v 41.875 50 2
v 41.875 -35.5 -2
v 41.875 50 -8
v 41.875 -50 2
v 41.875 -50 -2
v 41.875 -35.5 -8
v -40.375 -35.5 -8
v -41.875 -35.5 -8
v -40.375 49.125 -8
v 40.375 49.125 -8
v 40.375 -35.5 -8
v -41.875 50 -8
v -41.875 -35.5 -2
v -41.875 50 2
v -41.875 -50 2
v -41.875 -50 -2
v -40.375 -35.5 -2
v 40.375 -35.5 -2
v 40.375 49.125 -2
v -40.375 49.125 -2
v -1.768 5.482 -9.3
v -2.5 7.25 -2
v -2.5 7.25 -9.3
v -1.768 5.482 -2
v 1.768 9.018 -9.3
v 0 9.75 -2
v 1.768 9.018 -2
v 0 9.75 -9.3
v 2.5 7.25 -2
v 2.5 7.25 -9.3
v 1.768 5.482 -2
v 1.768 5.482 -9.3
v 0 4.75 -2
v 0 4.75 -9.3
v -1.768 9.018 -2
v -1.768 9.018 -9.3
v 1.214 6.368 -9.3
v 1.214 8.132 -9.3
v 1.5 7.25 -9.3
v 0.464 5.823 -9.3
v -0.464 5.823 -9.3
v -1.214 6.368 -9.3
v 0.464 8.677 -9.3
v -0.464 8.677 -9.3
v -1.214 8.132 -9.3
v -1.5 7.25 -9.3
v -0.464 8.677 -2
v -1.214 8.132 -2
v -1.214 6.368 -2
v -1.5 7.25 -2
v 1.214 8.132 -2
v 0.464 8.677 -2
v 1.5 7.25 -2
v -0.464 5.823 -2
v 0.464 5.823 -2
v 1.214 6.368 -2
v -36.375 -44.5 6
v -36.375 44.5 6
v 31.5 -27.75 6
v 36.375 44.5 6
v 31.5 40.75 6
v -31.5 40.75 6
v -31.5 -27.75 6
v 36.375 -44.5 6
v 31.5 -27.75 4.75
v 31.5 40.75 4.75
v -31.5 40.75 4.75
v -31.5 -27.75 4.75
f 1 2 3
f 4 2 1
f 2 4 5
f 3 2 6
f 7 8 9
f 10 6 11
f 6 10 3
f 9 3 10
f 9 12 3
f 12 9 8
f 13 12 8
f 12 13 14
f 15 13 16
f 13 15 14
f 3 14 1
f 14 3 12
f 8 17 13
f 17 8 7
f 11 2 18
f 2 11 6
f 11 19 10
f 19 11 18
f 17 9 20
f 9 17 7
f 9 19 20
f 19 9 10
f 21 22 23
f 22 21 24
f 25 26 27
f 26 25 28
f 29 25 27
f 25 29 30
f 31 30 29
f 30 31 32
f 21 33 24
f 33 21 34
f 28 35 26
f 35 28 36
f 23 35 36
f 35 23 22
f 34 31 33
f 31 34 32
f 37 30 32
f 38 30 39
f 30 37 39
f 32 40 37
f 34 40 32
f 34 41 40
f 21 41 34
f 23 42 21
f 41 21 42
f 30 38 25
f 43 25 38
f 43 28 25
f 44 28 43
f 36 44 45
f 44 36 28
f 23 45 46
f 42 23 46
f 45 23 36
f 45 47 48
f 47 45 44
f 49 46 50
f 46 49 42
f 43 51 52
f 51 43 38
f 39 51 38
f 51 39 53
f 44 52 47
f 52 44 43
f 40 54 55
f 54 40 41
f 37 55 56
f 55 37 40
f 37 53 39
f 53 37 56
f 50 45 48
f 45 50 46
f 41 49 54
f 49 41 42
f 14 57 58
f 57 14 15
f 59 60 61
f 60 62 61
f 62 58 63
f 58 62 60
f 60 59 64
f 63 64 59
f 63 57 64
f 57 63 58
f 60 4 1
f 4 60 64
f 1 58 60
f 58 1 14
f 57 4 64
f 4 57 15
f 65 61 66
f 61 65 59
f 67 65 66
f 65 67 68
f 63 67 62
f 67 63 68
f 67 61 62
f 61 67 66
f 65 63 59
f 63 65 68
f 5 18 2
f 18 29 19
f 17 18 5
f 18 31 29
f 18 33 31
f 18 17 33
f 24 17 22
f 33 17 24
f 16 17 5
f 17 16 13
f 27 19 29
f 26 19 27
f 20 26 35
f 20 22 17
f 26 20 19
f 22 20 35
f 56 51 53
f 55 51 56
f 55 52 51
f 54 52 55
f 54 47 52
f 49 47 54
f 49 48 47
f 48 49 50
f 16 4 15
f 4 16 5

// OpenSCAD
// the overall length of the cartridge (make longer for more stuff, like a PC-6006 does)
OVERALL_LENGTH = 100;
OVERALL_WIDTH = 83.75;

RIB_HEIGHT = 4;

// What part of the shell to render
DRAW_WHICH = "top"; // [ "top", "bottom", "both" ]

// lip on side of cartridge (in 7.25mm, down 8mm)
TOP_LIP_Z = 8;
TOP_LIP_EXCURSION = 7.25;

// the thickness of the walls
WALL_WIDTH = 3;

// Space from the top-outside of the case to the top of the PCB
PCB_OFFSET_TOP = 11;
// Space from the bottom-outside of the case to the bottom of the PCB
PCB_OFFSET_BOTTOM = 6;
// Thickness of a cartridge PCB at the mounting holes
PCB_THICKNESS = 1.7;
// PCB hole size (M3 = 3)
PCB_HOLE_SIZE = 3.00;
// PCB support size (must be bigger than PCB_HOLE_SIZE)
PCB_STANDOFF_SIZE = 5.00;
// Height of the stud going through the PCB (must be more than PCB_THICKNESS)
PCB_STUD_HEIGHT = 5.5;

// Relative to the outer lip of the cartridge, dead centre X
STUD_LOCATIONS = [
    [ -36.441, 94.234 ],
    [ 36.965, 94.234 ],
    [ 36.965, 24.638 ],
    [ -36.441, 24.638 ],
];

module inner_cut($cut_height) {
    // The inner section cut out of the cartridge (to hold the PCB inside)
    cube([OVERALL_WIDTH - WALL_WIDTH, (OVERALL_LENGTH -     TOP_LIP_EXCURSION) - WALL_WIDTH, $cut_height], center = true);
}

if("top" == DRAW_WHICH || "both" == DRAW_WHICH) {
    // base top of the cartridge
cube([OVERALL_WIDTH, OVERALL_LENGTH, RIB_HEIGHT], center = true);
    
    translate([0, TOP_LIP_EXCURSION, -TOP_LIP_Z/2]){
        difference() {
            // the "meat" of the walls
            cube([OVERALL_WIDTH, OVERALL_LENGTH - TOP_LIP_EXCURSION * 2, TOP_LIP_Z], center = true);
            
            translate([0, -WALL_WIDTH, 0]) {                 // move down so the 'top' lip remains
                inner_cut(TOP_LIP_Z);
            }
        }
        
        // TODO: Side greebles
    }

    difference() {
        // topmost "pyramid" top of the cartridge
        _lip_z = RIB_HEIGHT;
        translate([0, 0, _lip_z]) {
            translate([0,0,0]) {
                _incursion = 11;
                _top_width = OVERALL_WIDTH - _incursion;
                _top_length = OVERALL_LENGTH - _incursion;
                
                // smoothly go down
                
                _pyr_scale_w = _top_width / OVERALL_WIDTH;
                _pyr_scale_l = _top_length / OVERALL_LENGTH;

                _pyramid_scale = [ _pyr_scale_w, _pyr_scale_l ]; 
                
                linear_extrude(height = _lip_z, center = true, scale = _pyramid_scale)
                    square([OVERALL_WIDTH, OVERALL_LENGTH], center = true);
                
                /*polyhedron(
                    points = [
                        // top corners
                        [ _width / -2, _length / -2, _lip_z/2 ],
                        [ _width / 2, _length / -2, _lip_z/2 ],
                        [ _width / 2, _length / 2, _lip_z/2 ],
                        [ _width / -2, _length / 2, _lip_z/2 ],
                
                        // bottom corners (this will suck with radius)
                        [ _bottom_width / -2, _bottom_length / -2, -_lip_z/2],
                        [ _bottom_width / 2, _bottom_length / -2, -_lip_z/2],
                        [ _bottom_width / 2, _bottom_length / 2, -_lip_z/2],
                        [ _bottom_width / -2, _bottom_length / 2, -_lip_z/2],
                        
                    ],
                    faces = [
                        // how is this not fucking closed?
                        [0, 1, 2, 3],
                        [4, 5, 6, 7],
                        [0, 3, 7, 4],
                        [3, 2, 6, 7],
                        [2, 1, 5, 6],
                        [1, 0, 4, 5]
                    ],
                    convexity=20
                );*/
            }
            
            // get it into the right space for the bottom
            translate([0, TOP_LIP_EXCURSION, -_lip_z - PCB_OFFSET_TOP/2 + PCB_THICKNESS]) {
                // translate top supports from here
                pcb_support_top();
            }
        }
        
        // sticker recess
        translate([0,6.5,_lip_z + 1.5]) {
            cube([63, 68.5, 1.5], center = true);
        }
    }
}

module pcb_support_top() {
    // Bottom has a mounting stud with a hole in it
    difference() {
        cylinder(PCB_OFFSET_TOP, d = PCB_STANDOFF_SIZE, center = true);
        cylinder(PCB_STUD_HEIGHT * 2, d = PCB_HOLE_SIZE, center=true, $fn = 10);
    }
}

module pcb_support_bottom() {
    // Bottom has a mounting stud with a pin in it
    union() {
        cylinder(PCB_OFFSET_BOTTOM, d = PCB_STANDOFF_SIZE, center = true);
        translate([0, 0, PCB_STUD_HEIGHT]) {
            cylinder(PCB_STUD_HEIGHT, d = PCB_HOLE_SIZE, center=true, $fn = 10);
        }
    }
}

if("bottom" == DRAW_WHICH || "both" == DRAW_WHICH) {
    BOT_LENGTH = OVERALL_LENGTH - (TOP_LIP_EXCURSION * 2);
    BOT_HEIGHT = 11;
    BOT_OFFSET = TOP_LIP_EXCURSION;
    
    translate([0, BOT_OFFSET, (-BOT_HEIGHT / 2) - TOP_LIP_Z]) {
        difference() {
            cube([OVERALL_WIDTH, BOT_LENGTH, BOT_HEIGHT], center = true);
            
            translate([0,-WALL_WIDTH,WALL_WIDTH]) {
                inner_cut(BOT_HEIGHT);
            }
        }        
        
        // check my math on this one, but i think it's not in the wall far enough
        translate([0, 0, -(WALL_WIDTH - PCB_OFFSET_BOTTOM/2)]) {
            for(v = STUD_LOCATIONS) {
                // translate the lip offset?
                translate([0, -(TOP_LIP_EXCURSION + OVERALL_LENGTH/2), 0]) {
                    translate(v) {
                        pcb_support_bottom();
                        // only did two? that's weird
                    }
                }
            }
        }
    }        
}

// TODO: Entire bottom half (with #defines)
// TODO: Screw holes to mount PCB (ROMRAM is 97.7 mm long, its mounting holes are ridiculous)
